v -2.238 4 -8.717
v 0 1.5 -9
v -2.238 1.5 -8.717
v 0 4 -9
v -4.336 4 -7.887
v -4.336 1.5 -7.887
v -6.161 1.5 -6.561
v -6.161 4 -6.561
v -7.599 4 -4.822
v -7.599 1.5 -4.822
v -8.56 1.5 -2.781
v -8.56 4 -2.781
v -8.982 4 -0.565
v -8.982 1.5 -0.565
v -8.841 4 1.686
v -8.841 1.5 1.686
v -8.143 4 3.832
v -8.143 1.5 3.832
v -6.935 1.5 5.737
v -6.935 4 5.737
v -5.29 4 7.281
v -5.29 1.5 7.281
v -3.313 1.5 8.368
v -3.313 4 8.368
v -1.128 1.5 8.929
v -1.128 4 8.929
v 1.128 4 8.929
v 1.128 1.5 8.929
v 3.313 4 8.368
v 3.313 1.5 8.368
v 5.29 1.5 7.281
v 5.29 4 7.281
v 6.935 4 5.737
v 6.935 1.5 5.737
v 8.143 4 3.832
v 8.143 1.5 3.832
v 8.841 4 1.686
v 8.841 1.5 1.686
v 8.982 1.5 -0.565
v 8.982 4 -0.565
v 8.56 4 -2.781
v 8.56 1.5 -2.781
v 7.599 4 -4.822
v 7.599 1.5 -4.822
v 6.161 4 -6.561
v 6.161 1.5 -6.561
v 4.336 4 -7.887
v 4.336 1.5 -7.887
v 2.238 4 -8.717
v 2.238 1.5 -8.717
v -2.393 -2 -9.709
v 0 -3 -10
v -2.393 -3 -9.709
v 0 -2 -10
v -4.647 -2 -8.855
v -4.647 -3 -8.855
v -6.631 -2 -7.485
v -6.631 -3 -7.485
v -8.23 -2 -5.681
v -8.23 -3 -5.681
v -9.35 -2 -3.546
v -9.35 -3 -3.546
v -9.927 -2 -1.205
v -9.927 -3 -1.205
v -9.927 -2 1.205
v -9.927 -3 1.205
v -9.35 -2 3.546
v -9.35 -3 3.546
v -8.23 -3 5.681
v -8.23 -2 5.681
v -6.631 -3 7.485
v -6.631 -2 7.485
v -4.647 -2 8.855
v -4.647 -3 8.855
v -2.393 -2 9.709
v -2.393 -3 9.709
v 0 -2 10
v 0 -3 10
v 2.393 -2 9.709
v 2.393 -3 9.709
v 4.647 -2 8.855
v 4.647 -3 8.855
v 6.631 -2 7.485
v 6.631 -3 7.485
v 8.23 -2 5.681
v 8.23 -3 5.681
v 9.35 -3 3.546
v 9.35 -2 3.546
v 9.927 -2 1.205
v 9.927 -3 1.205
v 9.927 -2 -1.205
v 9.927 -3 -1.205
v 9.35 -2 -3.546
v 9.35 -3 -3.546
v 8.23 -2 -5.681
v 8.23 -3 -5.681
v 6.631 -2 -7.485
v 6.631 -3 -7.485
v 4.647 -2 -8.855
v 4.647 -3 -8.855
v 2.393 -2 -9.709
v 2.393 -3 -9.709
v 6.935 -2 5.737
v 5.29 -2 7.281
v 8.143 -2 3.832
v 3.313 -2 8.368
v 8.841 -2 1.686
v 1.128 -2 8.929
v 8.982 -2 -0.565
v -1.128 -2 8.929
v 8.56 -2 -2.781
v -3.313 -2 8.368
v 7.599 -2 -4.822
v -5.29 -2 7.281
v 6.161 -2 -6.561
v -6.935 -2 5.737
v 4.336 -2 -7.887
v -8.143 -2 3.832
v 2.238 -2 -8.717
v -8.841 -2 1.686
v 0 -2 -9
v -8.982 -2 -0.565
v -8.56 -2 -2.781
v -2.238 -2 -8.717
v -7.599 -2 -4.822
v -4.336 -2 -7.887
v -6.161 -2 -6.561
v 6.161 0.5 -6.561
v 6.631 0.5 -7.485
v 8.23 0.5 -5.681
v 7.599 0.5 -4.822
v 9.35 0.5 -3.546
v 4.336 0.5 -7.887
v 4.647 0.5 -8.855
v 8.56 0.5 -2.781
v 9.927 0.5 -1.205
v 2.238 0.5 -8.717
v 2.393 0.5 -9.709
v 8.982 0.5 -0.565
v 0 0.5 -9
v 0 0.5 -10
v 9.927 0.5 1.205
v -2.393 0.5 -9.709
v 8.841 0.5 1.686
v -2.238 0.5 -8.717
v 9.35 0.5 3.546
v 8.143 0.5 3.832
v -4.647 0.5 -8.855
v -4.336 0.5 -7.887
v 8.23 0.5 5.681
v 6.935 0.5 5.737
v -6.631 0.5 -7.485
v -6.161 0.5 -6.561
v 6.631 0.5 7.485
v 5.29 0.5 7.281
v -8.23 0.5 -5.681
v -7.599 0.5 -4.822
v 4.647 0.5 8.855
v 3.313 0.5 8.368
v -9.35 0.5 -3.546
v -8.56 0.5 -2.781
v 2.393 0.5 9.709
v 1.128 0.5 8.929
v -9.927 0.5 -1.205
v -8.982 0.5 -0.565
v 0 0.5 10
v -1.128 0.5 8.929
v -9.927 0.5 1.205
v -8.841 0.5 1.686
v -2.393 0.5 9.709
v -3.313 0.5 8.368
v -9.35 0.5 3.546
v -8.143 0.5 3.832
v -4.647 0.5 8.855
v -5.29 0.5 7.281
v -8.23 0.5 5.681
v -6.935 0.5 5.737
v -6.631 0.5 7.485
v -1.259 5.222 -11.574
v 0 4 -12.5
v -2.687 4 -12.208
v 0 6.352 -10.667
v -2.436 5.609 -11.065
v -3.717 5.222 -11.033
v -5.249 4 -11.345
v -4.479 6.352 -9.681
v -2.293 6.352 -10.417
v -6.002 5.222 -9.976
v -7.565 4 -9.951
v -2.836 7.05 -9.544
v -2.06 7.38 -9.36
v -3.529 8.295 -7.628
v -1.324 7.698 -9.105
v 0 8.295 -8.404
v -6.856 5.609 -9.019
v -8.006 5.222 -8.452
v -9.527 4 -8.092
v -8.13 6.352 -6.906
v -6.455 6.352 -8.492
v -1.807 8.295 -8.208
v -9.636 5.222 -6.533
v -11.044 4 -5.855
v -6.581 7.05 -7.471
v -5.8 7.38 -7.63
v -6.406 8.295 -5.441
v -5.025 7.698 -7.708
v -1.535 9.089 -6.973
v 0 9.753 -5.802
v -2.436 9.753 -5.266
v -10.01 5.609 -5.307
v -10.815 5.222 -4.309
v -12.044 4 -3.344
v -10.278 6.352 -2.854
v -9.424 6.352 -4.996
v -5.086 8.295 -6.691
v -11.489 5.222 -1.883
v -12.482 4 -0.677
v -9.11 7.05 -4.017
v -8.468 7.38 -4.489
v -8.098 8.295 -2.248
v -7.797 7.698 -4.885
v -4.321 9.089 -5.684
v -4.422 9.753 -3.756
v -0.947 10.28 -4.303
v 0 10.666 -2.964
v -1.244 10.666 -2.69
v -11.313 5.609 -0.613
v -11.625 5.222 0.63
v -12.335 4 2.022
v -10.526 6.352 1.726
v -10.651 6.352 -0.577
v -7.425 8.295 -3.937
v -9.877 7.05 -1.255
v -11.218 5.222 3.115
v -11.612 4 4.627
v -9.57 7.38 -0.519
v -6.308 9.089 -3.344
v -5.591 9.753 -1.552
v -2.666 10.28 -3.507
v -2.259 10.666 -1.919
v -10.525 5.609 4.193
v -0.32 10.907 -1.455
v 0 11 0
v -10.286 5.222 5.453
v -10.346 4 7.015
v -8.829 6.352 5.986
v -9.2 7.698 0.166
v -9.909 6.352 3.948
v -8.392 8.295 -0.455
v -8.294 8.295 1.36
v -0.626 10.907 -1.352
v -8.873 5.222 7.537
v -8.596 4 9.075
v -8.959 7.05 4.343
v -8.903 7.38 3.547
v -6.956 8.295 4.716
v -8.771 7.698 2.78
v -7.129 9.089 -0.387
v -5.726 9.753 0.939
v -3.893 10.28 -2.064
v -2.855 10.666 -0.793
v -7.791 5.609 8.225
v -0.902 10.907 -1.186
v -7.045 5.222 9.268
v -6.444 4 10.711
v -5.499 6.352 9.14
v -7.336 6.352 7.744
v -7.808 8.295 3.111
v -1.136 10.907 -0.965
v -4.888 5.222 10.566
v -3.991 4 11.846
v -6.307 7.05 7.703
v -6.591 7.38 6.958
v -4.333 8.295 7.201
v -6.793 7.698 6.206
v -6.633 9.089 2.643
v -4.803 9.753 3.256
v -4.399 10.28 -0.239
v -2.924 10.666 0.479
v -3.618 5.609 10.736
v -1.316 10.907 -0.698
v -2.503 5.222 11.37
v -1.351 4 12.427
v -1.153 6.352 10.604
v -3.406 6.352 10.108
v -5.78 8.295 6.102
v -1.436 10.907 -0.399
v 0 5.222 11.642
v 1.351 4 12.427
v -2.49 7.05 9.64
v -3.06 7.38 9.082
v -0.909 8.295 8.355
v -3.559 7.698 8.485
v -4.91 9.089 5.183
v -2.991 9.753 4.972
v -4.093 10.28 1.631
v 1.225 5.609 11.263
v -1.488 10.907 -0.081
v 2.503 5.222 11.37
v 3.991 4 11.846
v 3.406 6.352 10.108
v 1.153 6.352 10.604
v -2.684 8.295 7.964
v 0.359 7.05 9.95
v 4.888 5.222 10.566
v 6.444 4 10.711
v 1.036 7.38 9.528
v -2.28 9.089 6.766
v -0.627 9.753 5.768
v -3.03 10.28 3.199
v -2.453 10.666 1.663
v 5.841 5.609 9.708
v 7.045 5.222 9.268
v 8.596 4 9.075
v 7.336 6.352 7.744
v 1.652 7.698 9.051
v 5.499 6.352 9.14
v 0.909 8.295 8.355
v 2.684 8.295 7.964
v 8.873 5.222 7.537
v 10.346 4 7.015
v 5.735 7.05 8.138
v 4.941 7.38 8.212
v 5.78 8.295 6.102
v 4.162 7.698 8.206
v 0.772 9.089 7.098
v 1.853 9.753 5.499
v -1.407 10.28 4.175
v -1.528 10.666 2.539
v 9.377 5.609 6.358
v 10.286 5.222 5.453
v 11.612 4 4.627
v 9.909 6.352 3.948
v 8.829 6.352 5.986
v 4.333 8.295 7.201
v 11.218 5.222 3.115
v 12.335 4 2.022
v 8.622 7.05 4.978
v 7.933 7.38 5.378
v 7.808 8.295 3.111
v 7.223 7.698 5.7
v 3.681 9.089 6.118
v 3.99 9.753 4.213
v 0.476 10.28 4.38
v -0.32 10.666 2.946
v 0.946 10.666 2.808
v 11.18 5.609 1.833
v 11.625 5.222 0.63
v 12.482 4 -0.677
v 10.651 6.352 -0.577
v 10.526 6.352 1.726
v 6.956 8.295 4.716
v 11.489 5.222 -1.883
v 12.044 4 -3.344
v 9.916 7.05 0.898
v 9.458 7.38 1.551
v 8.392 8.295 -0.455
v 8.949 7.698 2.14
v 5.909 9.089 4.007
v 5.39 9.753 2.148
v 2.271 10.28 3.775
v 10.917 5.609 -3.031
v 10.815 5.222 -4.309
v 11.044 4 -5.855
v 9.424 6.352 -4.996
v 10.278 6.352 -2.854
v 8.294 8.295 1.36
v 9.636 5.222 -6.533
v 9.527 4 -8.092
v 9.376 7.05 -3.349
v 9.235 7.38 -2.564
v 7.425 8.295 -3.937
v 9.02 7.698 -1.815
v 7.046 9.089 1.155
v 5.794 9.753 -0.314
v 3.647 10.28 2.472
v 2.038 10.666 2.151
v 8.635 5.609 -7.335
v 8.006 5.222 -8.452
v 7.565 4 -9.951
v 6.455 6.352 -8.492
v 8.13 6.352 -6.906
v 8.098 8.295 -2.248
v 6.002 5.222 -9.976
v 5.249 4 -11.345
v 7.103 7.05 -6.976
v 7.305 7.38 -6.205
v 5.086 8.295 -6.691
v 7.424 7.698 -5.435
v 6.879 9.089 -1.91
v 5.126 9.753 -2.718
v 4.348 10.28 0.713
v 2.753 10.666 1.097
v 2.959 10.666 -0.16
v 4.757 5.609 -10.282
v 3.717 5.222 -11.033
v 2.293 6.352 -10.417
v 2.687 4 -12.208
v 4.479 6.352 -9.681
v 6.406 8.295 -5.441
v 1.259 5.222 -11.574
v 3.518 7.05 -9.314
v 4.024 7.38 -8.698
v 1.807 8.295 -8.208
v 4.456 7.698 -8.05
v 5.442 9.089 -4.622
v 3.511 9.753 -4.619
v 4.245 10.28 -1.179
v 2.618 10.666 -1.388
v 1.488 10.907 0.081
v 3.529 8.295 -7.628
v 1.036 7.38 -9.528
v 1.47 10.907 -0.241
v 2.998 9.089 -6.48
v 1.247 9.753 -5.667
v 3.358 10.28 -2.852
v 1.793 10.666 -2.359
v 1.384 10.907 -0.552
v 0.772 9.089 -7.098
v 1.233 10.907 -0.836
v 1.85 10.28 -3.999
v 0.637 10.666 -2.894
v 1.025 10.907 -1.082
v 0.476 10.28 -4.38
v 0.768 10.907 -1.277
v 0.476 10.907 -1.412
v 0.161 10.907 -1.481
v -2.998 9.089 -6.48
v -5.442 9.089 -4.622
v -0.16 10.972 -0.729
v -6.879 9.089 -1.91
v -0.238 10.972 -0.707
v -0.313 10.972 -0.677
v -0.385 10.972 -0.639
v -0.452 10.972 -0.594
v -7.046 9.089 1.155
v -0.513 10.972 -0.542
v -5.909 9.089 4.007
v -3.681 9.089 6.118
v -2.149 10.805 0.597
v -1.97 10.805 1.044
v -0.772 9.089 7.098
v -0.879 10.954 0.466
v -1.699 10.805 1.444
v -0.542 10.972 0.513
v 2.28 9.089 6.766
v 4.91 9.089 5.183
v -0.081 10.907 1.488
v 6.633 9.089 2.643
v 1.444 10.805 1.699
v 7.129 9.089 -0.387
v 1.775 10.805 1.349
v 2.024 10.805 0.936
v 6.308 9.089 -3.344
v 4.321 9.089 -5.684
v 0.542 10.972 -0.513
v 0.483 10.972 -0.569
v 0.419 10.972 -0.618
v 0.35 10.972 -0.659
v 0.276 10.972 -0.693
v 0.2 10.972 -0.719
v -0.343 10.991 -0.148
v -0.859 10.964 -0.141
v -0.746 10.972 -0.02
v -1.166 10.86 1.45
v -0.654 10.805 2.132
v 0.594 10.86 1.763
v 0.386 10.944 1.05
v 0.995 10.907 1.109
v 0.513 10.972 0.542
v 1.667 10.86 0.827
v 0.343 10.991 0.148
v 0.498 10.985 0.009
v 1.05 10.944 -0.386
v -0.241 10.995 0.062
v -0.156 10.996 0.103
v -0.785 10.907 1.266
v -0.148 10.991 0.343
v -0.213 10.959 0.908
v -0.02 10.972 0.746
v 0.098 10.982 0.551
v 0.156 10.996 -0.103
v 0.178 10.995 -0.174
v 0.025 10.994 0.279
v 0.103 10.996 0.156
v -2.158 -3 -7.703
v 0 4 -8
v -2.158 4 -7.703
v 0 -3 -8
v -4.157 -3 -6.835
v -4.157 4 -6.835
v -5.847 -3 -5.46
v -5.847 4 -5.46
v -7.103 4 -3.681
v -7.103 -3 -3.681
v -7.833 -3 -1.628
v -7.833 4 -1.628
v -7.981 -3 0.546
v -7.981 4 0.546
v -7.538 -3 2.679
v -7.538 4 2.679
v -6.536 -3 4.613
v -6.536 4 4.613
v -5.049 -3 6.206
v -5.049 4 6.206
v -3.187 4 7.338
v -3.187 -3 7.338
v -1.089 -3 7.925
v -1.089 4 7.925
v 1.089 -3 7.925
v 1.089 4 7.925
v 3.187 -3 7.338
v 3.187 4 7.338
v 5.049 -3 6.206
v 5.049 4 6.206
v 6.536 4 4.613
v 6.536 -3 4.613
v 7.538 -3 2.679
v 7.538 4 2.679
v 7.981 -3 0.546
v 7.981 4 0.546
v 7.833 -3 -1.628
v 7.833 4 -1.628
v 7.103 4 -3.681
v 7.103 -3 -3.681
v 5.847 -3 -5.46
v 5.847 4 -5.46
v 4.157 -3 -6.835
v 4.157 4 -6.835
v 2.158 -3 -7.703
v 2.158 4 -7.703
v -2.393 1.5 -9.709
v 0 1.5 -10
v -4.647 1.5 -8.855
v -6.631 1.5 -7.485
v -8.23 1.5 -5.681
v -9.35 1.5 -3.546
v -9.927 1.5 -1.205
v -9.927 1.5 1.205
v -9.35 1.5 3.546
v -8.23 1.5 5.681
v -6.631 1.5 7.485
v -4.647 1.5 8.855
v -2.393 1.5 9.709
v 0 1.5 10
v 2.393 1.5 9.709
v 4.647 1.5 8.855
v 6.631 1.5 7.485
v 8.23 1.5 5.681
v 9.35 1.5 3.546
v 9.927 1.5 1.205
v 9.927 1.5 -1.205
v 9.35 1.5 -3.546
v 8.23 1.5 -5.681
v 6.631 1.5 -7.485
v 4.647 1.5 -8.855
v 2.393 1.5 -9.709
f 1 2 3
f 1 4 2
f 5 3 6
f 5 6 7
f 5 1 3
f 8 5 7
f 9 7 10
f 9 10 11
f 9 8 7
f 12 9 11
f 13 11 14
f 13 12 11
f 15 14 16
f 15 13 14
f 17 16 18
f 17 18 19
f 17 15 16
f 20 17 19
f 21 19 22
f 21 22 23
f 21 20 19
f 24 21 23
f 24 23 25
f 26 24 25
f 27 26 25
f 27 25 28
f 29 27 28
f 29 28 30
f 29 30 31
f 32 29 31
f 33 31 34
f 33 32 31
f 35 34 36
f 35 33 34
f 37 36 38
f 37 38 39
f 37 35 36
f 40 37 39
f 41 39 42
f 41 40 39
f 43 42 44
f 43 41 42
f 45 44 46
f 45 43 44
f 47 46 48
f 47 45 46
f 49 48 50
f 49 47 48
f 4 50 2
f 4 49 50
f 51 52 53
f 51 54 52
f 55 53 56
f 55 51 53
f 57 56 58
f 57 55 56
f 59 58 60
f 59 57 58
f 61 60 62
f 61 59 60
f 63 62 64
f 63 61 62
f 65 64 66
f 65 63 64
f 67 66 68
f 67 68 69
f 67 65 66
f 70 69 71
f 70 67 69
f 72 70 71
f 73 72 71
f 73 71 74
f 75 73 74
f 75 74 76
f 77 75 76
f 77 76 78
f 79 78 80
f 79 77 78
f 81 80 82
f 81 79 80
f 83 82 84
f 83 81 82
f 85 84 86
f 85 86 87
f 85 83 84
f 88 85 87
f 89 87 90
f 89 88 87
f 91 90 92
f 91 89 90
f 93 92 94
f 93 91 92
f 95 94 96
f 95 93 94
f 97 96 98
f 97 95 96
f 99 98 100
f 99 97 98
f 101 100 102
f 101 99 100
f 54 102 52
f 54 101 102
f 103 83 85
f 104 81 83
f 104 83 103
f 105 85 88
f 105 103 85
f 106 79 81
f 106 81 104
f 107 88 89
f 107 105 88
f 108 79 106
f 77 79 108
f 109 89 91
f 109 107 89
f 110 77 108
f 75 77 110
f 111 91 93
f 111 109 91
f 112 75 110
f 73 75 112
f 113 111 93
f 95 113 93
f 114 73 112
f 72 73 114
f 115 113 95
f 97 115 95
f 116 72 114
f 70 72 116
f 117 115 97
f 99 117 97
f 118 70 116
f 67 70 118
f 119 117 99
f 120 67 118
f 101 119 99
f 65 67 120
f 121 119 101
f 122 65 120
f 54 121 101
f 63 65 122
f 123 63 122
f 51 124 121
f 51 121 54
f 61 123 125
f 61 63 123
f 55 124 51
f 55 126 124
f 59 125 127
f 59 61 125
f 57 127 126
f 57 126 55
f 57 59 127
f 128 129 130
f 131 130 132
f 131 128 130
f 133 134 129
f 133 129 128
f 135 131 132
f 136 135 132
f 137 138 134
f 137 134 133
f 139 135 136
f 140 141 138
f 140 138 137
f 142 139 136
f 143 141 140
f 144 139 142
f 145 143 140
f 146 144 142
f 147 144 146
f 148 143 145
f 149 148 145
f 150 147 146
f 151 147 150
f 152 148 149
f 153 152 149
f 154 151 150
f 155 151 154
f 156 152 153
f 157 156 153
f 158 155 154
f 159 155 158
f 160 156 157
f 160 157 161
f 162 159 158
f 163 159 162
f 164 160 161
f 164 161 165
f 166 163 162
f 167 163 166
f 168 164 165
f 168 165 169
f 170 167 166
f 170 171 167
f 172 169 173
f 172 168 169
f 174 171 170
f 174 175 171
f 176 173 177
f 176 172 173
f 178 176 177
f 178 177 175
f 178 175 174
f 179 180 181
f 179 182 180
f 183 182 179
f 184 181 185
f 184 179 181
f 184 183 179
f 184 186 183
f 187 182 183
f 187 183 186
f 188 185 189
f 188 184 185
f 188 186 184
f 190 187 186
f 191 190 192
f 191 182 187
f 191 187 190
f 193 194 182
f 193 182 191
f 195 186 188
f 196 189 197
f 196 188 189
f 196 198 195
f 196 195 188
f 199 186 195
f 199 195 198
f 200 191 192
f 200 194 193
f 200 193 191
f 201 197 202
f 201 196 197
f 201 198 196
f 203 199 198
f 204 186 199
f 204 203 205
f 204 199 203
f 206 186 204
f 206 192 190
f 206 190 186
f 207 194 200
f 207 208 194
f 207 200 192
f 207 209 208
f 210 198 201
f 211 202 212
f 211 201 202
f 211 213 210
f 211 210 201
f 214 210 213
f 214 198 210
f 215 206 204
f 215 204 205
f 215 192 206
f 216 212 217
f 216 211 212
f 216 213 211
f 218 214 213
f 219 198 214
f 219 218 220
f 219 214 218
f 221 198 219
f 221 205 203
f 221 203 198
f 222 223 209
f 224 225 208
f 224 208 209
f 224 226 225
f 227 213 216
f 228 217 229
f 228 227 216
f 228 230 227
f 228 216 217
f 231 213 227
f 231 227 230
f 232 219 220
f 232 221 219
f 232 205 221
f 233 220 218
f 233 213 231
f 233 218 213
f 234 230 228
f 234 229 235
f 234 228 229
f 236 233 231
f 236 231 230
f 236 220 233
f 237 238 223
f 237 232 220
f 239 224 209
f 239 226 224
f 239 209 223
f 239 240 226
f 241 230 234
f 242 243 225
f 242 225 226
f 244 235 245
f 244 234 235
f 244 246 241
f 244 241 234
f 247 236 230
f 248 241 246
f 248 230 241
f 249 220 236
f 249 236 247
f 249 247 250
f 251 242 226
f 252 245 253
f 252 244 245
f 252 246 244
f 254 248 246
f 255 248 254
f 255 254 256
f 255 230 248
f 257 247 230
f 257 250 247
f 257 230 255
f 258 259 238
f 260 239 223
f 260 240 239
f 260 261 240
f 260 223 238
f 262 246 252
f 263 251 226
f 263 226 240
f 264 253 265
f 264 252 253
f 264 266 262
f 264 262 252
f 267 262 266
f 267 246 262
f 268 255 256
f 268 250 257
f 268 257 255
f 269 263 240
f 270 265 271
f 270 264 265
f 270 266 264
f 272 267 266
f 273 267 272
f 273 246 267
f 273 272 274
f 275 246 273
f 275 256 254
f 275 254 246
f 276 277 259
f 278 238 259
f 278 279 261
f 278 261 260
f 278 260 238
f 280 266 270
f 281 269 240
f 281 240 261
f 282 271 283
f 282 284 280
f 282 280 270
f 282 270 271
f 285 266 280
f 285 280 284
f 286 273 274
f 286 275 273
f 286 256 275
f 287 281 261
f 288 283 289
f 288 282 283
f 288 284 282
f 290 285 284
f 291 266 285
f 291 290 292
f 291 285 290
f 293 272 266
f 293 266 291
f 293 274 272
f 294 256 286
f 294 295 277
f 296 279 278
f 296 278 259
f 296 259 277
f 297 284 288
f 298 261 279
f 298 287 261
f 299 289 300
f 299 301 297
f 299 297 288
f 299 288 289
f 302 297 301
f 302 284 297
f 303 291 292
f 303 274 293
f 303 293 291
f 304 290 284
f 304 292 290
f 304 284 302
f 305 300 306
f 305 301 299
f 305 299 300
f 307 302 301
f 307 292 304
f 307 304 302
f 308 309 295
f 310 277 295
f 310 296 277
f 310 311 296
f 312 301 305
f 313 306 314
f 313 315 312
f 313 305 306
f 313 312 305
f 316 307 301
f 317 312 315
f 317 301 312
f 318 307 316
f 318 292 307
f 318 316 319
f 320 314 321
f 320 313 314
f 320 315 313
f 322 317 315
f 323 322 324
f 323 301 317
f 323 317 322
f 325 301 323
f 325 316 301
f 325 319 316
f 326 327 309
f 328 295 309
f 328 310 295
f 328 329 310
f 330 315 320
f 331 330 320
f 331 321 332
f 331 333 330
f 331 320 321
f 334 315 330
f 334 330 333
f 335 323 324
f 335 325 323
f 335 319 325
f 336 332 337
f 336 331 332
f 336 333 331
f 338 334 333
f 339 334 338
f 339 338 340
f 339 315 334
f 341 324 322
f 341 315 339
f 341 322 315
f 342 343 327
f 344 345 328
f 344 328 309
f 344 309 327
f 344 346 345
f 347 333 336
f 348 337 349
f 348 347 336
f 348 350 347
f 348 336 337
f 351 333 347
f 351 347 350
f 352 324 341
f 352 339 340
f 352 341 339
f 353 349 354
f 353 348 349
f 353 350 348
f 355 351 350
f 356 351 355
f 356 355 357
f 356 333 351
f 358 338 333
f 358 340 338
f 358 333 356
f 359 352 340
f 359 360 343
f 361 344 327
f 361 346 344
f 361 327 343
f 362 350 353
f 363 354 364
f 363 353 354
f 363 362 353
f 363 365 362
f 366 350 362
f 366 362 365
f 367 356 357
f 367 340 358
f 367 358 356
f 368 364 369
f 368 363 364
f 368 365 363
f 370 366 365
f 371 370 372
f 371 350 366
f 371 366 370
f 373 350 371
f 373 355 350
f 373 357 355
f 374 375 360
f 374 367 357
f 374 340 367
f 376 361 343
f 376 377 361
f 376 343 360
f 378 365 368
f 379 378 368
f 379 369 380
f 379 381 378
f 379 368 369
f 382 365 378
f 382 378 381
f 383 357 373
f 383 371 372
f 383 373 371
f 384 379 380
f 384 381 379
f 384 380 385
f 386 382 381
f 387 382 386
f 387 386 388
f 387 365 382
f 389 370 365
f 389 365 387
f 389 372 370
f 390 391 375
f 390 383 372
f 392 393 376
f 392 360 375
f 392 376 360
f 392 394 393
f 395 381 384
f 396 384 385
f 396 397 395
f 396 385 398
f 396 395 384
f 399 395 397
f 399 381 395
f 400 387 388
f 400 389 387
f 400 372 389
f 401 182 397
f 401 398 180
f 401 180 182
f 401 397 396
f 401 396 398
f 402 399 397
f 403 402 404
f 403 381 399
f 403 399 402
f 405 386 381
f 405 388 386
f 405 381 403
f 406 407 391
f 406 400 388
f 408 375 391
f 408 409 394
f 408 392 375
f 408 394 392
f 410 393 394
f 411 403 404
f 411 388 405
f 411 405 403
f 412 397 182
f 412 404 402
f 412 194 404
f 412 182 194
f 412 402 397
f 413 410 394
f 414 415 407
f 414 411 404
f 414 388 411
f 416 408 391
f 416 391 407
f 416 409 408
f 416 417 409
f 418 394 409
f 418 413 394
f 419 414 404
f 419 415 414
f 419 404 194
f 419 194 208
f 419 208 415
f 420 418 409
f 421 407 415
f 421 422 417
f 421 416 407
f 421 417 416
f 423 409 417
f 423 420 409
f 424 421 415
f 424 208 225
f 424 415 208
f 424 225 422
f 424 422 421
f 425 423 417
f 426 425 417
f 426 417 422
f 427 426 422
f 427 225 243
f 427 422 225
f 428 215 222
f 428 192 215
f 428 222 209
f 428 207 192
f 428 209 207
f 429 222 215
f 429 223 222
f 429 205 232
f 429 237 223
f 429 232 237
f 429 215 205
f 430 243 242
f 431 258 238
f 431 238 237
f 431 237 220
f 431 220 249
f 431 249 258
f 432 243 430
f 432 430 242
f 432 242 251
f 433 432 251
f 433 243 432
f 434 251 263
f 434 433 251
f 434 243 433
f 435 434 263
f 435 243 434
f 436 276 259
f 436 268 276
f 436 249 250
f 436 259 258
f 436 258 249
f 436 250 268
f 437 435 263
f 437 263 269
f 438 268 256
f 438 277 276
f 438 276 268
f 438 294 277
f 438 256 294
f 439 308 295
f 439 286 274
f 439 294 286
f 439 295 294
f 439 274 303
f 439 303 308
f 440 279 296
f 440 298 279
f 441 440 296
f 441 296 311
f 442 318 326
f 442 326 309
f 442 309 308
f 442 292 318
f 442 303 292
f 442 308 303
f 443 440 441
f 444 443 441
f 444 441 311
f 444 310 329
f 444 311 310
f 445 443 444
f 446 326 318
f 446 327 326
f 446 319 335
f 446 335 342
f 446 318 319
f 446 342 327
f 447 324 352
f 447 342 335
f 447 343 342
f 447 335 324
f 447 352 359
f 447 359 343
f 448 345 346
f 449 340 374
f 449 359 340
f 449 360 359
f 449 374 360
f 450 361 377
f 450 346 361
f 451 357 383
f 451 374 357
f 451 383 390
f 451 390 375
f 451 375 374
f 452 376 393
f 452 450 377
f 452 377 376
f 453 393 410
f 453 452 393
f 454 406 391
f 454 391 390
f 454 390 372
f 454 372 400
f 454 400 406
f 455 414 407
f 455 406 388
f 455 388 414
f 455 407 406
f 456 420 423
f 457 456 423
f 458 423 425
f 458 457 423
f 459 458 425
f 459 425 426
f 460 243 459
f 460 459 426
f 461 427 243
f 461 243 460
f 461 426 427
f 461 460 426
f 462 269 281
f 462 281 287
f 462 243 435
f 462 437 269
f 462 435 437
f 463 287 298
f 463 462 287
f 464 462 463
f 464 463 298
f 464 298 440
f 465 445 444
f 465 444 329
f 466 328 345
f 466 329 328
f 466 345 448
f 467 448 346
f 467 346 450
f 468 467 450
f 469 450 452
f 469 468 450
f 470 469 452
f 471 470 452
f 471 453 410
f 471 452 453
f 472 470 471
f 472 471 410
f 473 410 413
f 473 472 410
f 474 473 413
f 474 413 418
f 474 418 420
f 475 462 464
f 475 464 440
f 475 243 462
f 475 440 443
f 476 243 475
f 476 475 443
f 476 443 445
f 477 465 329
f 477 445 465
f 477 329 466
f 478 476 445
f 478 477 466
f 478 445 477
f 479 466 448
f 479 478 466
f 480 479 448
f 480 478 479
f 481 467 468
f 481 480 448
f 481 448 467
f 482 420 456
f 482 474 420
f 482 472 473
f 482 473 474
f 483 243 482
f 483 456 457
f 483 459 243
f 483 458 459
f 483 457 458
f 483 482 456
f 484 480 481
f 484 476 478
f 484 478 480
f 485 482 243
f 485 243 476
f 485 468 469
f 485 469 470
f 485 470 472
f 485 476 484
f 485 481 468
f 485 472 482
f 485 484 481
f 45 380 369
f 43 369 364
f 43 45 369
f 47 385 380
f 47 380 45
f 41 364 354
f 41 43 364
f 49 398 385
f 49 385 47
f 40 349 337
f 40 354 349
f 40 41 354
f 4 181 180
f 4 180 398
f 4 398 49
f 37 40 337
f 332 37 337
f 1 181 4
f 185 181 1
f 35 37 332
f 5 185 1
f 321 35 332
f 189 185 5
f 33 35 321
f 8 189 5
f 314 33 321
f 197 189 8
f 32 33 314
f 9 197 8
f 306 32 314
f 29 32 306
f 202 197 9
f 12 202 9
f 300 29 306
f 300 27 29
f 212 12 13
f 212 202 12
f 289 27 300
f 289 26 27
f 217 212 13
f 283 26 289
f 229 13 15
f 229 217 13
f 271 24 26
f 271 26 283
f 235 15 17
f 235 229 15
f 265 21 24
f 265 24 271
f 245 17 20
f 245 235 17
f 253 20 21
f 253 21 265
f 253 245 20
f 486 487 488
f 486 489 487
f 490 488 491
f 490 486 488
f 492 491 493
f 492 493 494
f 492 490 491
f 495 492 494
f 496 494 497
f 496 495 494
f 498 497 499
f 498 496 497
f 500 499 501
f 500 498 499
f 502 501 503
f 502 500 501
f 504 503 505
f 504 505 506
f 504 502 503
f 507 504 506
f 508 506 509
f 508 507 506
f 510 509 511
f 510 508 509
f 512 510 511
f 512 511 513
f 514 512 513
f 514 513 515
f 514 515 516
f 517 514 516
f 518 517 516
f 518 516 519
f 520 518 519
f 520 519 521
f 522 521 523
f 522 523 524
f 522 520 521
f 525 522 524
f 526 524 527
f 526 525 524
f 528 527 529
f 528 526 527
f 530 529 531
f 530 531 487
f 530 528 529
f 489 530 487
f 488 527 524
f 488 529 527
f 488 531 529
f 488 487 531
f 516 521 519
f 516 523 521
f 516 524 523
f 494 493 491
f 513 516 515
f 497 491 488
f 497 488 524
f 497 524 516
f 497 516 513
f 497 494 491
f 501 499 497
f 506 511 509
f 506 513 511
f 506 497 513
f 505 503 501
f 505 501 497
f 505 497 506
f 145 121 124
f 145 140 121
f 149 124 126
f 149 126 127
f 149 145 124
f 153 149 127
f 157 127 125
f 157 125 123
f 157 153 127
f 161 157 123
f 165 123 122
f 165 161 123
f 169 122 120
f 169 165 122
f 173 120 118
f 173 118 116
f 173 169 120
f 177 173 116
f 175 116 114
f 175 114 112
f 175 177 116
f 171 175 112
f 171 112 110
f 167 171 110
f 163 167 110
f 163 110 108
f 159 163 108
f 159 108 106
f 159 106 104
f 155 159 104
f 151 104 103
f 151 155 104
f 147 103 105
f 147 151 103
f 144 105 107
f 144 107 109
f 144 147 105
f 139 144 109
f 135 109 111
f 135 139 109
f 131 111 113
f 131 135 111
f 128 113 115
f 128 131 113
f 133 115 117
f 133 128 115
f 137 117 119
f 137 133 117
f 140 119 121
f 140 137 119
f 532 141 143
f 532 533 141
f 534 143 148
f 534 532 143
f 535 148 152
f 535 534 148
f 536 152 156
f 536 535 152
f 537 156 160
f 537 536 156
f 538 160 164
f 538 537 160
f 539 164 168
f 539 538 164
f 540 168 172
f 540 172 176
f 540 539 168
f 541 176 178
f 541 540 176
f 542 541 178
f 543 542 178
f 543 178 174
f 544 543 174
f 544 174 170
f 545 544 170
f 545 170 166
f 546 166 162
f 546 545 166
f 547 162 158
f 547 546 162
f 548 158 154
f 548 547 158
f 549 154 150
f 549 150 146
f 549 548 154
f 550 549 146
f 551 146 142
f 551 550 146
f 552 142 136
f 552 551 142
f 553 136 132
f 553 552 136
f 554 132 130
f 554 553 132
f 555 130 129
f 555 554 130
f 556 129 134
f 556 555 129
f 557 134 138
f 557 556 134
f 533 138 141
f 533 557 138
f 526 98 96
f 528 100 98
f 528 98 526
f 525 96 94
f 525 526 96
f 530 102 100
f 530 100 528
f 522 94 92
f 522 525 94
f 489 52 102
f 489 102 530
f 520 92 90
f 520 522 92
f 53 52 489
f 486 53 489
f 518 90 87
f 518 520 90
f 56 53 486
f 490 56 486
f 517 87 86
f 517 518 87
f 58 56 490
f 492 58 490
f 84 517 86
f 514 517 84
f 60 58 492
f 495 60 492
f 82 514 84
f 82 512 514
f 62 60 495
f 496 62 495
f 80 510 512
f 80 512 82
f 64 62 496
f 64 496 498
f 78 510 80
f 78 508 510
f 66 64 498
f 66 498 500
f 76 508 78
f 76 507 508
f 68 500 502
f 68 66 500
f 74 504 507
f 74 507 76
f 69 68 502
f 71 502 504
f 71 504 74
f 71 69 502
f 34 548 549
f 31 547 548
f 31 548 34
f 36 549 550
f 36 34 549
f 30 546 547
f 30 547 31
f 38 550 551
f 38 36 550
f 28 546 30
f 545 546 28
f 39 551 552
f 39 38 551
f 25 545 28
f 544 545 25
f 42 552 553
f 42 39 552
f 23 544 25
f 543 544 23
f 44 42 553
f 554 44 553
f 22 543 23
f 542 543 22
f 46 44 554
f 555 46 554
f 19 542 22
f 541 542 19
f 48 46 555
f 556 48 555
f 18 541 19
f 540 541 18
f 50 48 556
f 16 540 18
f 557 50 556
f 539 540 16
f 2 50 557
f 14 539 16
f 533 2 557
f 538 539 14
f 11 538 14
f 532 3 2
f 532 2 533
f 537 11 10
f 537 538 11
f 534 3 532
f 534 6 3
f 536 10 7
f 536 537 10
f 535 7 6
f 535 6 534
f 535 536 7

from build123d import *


with BuildPart() as part:
    # Эскиз1 → Повернуть1 (revolve)
    with BuildSketch(Plane.XY, mode=Mode.PRIVATE) as revolve_1_sk:
        with BuildLine():
            Line((-8, 4), (-8, -3))
            Line((-8, -3), (-10, -3))
            Line((-10, -3), (-10, -2))
            Line((-10, -2), (-9, -2))
            Line((-9, -2), (-9, 0.5))
            Line((-9, 0.5), (-10, 0.5))
            Line((-10, 0.5), (-10, 1.5))
            Line((-10, 1.5), (-9, 1.5))
            Line((-9, 1.5), (-9, 4))
            Line((-9, 4), (-12.5, 4))
            ThreePointArc((-12.5, 4), (-7.139719689, 9.088785159), (0, 11))
            Line((0, 11), (0, 4))
            Line((0, 4), (-8, 4))
        make_face()
    revolve(revolve_1_sk.sketch.rotate(Axis((0, 4, 0), (0, 1, 0)), 270), axis=Axis((0, 4, 0), (0, 1, 0)))


solid = part.part
